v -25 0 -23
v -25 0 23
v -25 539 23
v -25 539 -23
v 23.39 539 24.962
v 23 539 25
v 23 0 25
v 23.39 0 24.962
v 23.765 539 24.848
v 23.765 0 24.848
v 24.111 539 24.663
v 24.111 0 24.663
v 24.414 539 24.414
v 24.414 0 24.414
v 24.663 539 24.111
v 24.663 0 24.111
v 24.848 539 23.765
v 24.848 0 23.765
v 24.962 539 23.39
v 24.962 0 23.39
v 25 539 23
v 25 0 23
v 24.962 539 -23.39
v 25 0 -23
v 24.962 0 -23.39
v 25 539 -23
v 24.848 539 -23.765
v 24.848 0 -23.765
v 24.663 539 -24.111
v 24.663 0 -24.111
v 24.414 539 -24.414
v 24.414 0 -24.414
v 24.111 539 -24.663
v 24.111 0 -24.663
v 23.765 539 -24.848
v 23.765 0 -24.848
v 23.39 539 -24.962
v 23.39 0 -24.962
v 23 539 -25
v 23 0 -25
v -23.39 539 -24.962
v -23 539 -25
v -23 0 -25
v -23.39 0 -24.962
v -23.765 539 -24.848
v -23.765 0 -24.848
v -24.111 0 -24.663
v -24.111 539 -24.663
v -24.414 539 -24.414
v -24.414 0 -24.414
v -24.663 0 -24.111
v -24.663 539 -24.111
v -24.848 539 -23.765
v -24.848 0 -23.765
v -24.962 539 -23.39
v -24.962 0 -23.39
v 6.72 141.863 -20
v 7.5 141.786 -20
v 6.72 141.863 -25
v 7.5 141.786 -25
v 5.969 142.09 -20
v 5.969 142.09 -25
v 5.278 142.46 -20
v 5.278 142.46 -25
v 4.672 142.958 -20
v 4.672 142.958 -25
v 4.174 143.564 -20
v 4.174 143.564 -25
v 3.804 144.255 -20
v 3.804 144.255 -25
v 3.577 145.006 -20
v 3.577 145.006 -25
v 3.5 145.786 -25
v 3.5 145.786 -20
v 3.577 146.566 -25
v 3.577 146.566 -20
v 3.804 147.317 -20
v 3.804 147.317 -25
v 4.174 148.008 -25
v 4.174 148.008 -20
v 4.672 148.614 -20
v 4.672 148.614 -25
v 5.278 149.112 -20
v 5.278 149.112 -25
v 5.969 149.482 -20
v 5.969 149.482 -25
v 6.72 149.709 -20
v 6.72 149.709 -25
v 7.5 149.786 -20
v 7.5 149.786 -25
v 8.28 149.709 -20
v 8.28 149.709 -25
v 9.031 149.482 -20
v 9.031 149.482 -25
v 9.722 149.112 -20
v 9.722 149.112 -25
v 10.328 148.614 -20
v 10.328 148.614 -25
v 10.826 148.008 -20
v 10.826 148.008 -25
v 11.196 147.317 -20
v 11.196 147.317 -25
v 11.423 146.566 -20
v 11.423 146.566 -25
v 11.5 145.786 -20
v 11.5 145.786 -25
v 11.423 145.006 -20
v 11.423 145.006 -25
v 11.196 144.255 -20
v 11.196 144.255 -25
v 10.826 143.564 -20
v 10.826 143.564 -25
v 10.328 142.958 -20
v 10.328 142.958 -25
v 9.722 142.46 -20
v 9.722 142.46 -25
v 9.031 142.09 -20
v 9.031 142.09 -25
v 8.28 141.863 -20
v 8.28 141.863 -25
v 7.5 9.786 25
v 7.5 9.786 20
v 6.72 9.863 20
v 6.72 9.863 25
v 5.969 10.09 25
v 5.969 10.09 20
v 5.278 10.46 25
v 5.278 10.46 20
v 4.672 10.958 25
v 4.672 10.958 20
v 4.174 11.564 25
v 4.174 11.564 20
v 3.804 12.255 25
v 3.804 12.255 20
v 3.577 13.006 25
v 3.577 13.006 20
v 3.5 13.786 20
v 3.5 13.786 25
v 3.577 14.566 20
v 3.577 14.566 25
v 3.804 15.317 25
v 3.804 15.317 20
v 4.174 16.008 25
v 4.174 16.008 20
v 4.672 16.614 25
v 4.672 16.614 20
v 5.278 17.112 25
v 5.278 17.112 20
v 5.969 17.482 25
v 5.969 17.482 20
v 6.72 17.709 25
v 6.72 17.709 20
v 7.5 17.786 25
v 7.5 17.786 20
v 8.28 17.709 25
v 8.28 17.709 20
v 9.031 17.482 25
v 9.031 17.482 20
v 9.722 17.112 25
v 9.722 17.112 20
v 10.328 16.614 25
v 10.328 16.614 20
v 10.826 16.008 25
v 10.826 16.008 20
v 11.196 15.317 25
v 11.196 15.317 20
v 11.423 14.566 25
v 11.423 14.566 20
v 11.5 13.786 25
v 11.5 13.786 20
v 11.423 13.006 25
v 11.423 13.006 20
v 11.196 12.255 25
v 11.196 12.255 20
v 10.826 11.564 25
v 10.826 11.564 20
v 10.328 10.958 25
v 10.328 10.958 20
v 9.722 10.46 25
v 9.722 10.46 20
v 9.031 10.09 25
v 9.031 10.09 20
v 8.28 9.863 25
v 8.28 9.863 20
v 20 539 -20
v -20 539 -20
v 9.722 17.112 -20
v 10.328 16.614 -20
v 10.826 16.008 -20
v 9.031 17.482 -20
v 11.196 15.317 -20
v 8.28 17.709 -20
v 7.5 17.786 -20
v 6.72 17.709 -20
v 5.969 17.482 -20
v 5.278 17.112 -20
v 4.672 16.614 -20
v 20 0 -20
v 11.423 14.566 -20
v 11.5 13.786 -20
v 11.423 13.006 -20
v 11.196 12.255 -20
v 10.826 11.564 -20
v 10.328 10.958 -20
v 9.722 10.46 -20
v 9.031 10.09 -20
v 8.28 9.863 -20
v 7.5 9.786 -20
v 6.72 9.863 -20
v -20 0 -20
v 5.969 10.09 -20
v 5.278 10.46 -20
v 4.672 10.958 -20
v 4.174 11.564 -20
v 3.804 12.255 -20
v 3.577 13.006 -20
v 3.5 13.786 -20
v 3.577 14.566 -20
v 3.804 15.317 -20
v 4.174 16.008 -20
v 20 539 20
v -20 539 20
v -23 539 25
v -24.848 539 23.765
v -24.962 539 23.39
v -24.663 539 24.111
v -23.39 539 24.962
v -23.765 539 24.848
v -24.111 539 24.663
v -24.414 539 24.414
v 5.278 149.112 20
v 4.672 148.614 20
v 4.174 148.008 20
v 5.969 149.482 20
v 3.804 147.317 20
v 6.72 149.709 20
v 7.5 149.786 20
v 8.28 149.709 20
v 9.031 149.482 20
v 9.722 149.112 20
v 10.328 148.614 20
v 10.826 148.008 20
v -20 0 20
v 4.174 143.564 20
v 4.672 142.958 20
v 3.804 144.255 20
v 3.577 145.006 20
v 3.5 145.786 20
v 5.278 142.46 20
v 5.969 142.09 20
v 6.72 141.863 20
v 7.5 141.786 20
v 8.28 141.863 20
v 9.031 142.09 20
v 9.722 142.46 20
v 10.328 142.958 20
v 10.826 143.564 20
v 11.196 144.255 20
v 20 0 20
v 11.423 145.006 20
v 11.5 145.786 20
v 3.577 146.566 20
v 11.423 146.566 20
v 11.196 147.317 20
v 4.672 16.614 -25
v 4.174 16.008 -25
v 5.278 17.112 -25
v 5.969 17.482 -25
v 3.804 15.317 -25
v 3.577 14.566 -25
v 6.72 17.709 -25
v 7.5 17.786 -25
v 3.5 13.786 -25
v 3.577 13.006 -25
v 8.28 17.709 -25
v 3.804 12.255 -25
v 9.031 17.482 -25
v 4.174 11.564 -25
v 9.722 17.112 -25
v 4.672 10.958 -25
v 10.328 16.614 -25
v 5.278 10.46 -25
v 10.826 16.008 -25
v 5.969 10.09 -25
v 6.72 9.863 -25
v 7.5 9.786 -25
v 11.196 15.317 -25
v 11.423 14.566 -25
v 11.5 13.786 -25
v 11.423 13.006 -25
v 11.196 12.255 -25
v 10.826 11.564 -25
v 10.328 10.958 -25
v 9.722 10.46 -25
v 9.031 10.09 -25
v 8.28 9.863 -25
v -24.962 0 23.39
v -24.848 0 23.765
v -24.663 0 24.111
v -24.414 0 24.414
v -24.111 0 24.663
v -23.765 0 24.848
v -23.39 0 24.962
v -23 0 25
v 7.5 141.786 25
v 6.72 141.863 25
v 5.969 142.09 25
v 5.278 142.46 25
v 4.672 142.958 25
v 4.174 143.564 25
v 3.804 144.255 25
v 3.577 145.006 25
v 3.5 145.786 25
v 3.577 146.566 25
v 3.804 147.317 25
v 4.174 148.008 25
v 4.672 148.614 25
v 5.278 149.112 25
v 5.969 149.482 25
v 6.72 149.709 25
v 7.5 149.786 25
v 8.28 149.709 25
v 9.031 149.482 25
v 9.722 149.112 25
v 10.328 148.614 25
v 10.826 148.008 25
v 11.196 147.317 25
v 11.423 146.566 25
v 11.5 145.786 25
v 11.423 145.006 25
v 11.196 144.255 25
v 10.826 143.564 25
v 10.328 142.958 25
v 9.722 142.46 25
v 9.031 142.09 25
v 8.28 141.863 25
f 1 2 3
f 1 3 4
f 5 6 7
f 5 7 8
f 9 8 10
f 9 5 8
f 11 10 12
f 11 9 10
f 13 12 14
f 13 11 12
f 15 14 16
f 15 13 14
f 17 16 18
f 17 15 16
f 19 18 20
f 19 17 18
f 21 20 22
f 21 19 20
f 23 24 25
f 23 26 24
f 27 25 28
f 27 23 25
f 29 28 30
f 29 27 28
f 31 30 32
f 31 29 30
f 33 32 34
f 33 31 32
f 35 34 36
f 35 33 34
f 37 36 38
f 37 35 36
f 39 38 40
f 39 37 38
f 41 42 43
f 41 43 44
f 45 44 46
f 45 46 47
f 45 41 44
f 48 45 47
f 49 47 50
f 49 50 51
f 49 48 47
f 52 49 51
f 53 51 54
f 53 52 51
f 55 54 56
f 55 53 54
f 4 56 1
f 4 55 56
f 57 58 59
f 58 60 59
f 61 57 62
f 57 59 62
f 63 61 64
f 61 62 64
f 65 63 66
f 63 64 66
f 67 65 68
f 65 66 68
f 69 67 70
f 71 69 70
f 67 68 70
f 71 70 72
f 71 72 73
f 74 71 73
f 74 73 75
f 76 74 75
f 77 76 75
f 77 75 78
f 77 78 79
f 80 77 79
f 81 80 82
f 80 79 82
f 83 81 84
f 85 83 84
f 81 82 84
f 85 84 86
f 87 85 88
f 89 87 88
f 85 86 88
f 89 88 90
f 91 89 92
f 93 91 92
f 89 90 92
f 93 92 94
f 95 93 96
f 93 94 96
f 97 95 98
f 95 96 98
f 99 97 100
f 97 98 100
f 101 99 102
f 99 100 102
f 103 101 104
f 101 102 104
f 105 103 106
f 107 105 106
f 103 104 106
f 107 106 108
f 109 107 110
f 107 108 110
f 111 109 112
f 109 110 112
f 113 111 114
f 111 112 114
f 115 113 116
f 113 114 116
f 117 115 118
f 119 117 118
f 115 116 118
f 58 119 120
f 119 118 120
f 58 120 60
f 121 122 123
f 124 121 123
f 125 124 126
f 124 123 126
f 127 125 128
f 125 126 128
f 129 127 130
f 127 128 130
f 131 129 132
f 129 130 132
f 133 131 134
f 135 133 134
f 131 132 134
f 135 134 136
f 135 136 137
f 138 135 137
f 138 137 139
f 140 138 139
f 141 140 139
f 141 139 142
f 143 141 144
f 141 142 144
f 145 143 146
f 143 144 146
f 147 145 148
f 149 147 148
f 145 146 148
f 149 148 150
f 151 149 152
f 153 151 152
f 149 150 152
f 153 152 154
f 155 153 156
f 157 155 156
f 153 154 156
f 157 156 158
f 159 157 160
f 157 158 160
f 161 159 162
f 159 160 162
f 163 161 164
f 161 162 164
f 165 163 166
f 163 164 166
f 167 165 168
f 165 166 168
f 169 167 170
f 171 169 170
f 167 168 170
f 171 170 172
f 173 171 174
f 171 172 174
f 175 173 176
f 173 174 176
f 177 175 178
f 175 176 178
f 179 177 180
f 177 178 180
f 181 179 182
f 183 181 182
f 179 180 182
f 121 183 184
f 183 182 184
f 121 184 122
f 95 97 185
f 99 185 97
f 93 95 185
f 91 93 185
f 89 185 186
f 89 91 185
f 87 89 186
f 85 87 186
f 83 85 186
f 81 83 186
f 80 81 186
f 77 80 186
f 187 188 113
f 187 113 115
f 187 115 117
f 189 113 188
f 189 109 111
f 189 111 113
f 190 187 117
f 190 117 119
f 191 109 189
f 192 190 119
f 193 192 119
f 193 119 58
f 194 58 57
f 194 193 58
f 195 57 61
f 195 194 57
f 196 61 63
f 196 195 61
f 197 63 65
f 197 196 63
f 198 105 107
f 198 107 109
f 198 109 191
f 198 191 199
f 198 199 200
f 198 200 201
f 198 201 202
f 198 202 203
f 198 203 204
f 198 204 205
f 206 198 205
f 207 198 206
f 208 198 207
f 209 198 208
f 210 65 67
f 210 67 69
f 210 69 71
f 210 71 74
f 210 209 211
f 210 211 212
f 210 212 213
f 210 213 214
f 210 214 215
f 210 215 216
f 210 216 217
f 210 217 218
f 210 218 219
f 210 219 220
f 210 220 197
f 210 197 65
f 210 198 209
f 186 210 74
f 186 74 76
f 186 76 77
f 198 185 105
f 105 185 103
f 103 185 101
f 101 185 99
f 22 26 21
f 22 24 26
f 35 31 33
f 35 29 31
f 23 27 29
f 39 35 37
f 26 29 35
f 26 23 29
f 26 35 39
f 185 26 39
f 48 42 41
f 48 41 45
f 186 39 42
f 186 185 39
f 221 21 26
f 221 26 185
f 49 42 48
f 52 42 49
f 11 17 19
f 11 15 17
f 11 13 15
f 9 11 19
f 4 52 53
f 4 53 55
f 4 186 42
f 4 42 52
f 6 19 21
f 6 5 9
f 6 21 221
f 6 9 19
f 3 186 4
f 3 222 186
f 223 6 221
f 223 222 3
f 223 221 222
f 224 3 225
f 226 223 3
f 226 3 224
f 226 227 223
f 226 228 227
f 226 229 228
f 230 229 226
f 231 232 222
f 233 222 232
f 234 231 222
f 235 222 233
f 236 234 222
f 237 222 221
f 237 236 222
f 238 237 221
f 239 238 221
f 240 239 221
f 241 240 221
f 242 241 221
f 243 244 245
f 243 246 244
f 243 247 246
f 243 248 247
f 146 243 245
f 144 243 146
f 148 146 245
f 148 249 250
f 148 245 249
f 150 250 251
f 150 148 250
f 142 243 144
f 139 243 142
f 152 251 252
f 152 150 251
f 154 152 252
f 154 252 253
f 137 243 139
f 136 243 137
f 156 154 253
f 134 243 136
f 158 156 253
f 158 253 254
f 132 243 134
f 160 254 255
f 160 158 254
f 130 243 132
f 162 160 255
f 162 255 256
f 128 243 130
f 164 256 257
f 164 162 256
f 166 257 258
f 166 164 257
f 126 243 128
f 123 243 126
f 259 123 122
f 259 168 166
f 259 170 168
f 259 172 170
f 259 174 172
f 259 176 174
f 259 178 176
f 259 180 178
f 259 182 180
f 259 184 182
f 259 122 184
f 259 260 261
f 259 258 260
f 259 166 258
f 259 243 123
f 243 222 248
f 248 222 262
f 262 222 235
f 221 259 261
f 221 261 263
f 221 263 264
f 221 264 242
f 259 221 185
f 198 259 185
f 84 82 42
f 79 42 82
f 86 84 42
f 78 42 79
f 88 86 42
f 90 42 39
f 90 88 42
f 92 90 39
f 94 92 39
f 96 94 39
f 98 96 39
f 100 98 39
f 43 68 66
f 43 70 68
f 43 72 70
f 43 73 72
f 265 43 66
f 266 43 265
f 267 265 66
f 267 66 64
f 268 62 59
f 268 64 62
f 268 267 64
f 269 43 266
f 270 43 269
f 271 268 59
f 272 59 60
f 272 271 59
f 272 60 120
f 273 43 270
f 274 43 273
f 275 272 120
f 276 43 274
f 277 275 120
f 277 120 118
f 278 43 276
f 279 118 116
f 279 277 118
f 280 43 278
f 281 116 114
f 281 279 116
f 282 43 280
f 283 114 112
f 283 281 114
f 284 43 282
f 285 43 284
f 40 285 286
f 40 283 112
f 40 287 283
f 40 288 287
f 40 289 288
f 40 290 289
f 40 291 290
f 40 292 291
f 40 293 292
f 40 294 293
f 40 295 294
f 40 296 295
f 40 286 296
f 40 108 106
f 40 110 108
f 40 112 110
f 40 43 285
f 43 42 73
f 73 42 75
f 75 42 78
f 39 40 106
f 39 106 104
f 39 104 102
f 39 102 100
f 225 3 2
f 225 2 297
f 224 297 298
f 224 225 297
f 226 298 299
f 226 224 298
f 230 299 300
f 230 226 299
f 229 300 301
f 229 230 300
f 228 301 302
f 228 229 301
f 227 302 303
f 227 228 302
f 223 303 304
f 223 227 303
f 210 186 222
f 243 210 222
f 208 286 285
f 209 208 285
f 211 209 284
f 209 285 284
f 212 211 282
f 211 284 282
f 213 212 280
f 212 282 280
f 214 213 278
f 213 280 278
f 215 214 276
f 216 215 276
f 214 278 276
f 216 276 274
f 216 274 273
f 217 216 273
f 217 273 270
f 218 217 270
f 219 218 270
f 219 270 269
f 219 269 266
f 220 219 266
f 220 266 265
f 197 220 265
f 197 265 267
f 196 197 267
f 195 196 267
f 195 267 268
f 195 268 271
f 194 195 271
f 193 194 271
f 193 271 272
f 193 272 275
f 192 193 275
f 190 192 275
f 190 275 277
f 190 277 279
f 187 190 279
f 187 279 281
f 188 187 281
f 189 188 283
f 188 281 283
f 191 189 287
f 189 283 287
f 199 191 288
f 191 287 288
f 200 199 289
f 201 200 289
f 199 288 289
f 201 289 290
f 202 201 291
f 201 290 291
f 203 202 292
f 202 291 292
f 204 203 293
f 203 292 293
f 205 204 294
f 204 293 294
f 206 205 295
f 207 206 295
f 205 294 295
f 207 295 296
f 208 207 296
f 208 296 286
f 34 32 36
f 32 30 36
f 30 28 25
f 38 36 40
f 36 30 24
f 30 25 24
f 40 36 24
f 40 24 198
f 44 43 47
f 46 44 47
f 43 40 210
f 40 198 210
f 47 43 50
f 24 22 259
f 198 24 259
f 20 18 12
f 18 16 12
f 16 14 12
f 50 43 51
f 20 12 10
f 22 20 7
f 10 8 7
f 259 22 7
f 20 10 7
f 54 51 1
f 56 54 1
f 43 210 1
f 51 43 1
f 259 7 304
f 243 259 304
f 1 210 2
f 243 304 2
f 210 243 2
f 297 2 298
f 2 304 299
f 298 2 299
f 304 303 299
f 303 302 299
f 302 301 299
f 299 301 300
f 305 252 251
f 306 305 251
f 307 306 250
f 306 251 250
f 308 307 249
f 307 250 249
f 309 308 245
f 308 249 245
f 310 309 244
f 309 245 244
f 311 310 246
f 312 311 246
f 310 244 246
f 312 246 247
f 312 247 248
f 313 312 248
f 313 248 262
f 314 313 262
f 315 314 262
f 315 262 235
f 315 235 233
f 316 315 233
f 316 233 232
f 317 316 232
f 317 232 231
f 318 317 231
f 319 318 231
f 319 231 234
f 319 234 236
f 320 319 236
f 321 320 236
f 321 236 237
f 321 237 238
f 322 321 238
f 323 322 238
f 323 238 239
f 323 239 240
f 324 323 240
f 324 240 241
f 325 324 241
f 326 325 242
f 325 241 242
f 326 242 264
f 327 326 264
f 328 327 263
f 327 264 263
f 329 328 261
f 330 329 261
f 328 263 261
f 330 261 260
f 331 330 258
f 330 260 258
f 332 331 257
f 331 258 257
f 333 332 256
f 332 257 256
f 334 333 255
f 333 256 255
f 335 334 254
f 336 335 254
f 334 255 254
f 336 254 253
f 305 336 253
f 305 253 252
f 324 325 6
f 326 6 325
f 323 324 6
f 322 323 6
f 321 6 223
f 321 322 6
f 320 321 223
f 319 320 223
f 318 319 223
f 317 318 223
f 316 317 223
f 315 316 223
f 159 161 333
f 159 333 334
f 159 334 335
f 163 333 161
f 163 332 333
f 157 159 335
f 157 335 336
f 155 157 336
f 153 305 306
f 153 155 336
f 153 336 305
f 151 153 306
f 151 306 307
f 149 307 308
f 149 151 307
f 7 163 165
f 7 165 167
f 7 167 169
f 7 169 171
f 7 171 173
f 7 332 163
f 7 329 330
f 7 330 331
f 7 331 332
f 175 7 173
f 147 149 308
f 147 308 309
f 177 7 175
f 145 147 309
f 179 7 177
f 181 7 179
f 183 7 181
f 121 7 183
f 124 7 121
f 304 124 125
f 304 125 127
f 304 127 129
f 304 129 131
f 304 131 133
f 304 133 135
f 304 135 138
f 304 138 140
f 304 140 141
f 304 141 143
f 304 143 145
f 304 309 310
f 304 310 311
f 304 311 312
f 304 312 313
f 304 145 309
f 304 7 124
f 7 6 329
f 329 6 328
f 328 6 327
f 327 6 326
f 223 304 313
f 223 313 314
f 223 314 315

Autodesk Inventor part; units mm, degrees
ref_plane "YZ Plane" through (0, 0, 0) normal (1, 0, 0) x (0, 1, 0)
ref_plane "XZ Plane" through (0, 0, 0) normal (0, 1, 0) x (-1, 0, 0)
ref_plane "XY Plane" through (0, 0, 0) normal (0, 0, 1) x (1, 0, 0)
sketch "Sketch1" plane through (0, 0, 0) normal (0, 1, 0) x (-1, 0, 0)
  line L0 (25, -25) -> (-25, -25)
  line L1 (-25, -25) -> (-25, 25)
  line L2 (-25, 25) -> (25, 25)
  line L3 (25, 25) -> (25, -25)
  line L4 (-20, -20) -> (20, -20)
  line L5 (20, -20) -> (20, 20)
  line L6 (20, 20) -> (-20, 20)
  line L7 (-20, 20) -> (-20, -20)
  point P0 (0, 0)
  dimension "d0" = 50
  dimension "d1" = 50
  dimension "d2" = 25
  dimension "d3" = 25
  dimension "d4" = 5
extrude "Extrusion1" add sketch "Sketch1" along normal blind 539
fillet "Fillet1" radius 2 4 edges at (25, 269.5, -25) (25, 269.5, 25) (-25, 269.5, 25) (-25, 269.5, -25)
sketch "Sketch2" plane through (-23, 0, 25) normal (0, 0, 1) x (1, 0, 0)
  line L0 (-78.8613, 79.786) -> (128.2392, 79.786)
  line L1 (0, 539) -> (46, 539) projected
  line L2 (48, 0) -> (48, 539) projected
  point P0 (23, 0)
  point P1 (30.5, 145.786)
  point P2 (30.5, 13.786)
  dimension "d19" = 459.214
  dimension "d22" = 66
  dimension "d23" = 66
  dimension "d24" = 17.5
  dimension "d25" = 0
hole "Hole1" at (7.5, 145.786, 25) at (7.5, 13.786, 25) direction (0, 0, -1) diameter 8 end through all
equation "\"d0\" = w"
equation "\"d1\" = d0"
equation "\"d2\" = 0.5 * d1"
equation "\"d3\" = 0.5 * d0"
equation "\"d4\" = t"
equation "\"d5\" = L"
equation "\"d23\" = d22"
equation "\"w\" = support_frame_squareBarDimension"
equation "\"t\" = support_frame_squareBarThickness"
equation "\"L\" = 539"
equation "\"hoop_angle_z\" = 45deg"
equation "\"hoop_bearing_length\" = 5deg"
equation "\"hoop_bushing12_od\" = -2 * hoop_thickness_large + hoop_width_large + hoop_bushing12_radialInterference"
equation "\"hoop_bushing12_radialInterference\" = 0"
equation "\"hoop_bushing12_thickness\" = -hoop_width_medium + hoop_bushing12_od - 2 * hoop_bushing12_radialInterference"
equation "\"hoop_bushing23_od\" = -2 * hoop_thickness_medium + hoop_width_medium + hoop_bushing23_radialInterference"
equation "\"hoop_bushing23_radialInterference\" = 0"
equation "\"hoop_bushing23_thickness\" = -hoop_width_small + hoop_bushing23_od - 2 * hoop_bushing23_radialInterference"
equation "\"hoop_cable_diam\" = 5"
equation "\"hoop_cable_pulley_diam\" = 22"
equation "\"hoop_tabs_hole\" = 12"
equation "\"hoop_tabs_thickness\" = 6"
equation "\"hoop_thickness_large\" = 4"
equation "\"hoop_thickness_medium\" = 3.2"
equation "\"hoop_thickness_small\" = 2"
equation "\"hoop_width_large\" = 51"
equation "\"hoop_width_medium\" = 33.7"
equation "\"hoop_width_small\" = 25.4"
equation "\"rack_tooth_addendum\" = 5"
equation "\"rack_tooth_dedendum\" = 5"
equation "\"rack_tooth_thickness\" = 5"
equation "\"secure_arm_angle\" = 35deg"
equation "\"secure_arm_radii\" = 9"
equation "\"sm_varx_member_tolerance\" = 0"
equation "\"sm_varx_pinPlate_holeDiameter\" = 5"
equation "\"sm_varx_pinPlate_thickness\" = 5"
equation "\"sm_varx_squareBarThickness\" = 2.5"
equation "\"support_baseClamp_platformLengthBuffer\" = 35"
equation "\"support_baseClamp_platformThickness\" = 15"
equation "\"support_baseClamp_platformWidthBuffer\" = 0"
equation "\"support_baseClamp_sleeveHoleDiameter\" = 12"
equation "\"support_baseClamp_sleeveSweepTerminationAngle\" = 55deg"
equation "\"support_baseClamp_thickness\" = 8"
equation "\"support_frame_endHoleBuffer\" = 45"
equation "\"support_frame_squareBarFillet\" = 2"
equation "\"support_frame_squareBarThickness\" = 5"
equation "\"wheelchair_deployed_height\" = 914"
equation "\"wheelchair_deployed_length\" = 1067"
equation "\"wheelchair_deployed_width\" = 635"
equation "\"wheelchatir_pos_deploy_angle_0\" = 65deg"
equation "\"wheelchatir_pos_store_angle_0\" = 90deg"
equation "\"wheelchatir_pos_deploy_angle_1\" = 20deg"
equation "\"wheelchatir_pos_store_angle_1\" = 20deg"
equation "\"support_frame_squareBarDimension\" = 50"
properties part number "support_frame_z" material "Steel, Mild"
